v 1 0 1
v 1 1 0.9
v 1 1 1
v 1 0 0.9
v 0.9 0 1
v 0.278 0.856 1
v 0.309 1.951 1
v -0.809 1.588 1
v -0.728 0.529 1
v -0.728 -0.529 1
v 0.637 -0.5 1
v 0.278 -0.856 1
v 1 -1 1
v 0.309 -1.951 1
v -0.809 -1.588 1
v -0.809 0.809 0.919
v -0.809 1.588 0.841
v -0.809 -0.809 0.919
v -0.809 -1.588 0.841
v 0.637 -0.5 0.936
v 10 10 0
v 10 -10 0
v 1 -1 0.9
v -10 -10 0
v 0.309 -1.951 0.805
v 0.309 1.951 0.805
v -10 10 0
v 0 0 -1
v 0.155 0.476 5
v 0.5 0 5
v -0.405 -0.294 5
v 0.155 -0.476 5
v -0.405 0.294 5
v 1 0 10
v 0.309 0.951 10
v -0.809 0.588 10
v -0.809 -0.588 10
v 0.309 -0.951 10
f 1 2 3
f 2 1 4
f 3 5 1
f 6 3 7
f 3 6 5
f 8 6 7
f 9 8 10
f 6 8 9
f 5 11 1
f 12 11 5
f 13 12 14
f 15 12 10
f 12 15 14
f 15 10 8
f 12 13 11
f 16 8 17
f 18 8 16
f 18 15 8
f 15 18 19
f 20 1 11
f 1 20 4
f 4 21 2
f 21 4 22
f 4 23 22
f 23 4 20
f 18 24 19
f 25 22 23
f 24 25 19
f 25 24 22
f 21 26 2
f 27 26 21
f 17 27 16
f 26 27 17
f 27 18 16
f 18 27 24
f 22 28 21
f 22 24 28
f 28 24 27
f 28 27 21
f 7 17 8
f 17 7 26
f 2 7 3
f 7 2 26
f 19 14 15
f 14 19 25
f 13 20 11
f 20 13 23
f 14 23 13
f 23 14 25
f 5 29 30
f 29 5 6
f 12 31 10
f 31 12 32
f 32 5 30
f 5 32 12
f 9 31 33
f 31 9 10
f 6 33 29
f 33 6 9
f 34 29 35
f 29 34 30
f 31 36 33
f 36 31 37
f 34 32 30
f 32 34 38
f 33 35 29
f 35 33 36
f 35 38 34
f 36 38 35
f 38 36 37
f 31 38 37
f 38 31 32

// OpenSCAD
inf = 1/0;
nan = inf / inf;
tests= [1,0,-1,-inf,nan,inf,"test"];
echo("Primitives");
for(i=tests){
    echo(str("i=",i,", primitive test"));

    cube([1,i,1]);
    sphere(i);
    cylinder(h=i);
    cylinder(r=i);
    square(i);
    square([1,i]);
    square([i,1]);
    circle(i);
    polyhedron(
      points=[ [10,10,0],[10,-10,0],[-10,-10,0],[-10,10,0], // the four points at base
               [0,0,i]  ],                                 // the apex point 
      faces=[ [0,1,4],[1,2,4],[2,3,4],[3,0,4],              // each triangle side
                  [1,0,3],[2,1,3] ]                         // two triangles for square base
     );
}
echo("Transformations");
for(i=tests){
    echo(str("i=",i,", transformation test"));
    scale(i)
    sphere();
    rotate(i);
    cube();
    translate([0,i,0])
    cylinder();
}
echo("Those are okay");
cylinder(r1=1,r2=0,h=10);
cylinder(r1=0,r2=1,h=10);

echo("cylinder with only r1 or r2 out of range");
cylinder(h=1, r1=-1);
cylinder(h=1, r2=-1);
cylinder(h=1, d2=-2);
